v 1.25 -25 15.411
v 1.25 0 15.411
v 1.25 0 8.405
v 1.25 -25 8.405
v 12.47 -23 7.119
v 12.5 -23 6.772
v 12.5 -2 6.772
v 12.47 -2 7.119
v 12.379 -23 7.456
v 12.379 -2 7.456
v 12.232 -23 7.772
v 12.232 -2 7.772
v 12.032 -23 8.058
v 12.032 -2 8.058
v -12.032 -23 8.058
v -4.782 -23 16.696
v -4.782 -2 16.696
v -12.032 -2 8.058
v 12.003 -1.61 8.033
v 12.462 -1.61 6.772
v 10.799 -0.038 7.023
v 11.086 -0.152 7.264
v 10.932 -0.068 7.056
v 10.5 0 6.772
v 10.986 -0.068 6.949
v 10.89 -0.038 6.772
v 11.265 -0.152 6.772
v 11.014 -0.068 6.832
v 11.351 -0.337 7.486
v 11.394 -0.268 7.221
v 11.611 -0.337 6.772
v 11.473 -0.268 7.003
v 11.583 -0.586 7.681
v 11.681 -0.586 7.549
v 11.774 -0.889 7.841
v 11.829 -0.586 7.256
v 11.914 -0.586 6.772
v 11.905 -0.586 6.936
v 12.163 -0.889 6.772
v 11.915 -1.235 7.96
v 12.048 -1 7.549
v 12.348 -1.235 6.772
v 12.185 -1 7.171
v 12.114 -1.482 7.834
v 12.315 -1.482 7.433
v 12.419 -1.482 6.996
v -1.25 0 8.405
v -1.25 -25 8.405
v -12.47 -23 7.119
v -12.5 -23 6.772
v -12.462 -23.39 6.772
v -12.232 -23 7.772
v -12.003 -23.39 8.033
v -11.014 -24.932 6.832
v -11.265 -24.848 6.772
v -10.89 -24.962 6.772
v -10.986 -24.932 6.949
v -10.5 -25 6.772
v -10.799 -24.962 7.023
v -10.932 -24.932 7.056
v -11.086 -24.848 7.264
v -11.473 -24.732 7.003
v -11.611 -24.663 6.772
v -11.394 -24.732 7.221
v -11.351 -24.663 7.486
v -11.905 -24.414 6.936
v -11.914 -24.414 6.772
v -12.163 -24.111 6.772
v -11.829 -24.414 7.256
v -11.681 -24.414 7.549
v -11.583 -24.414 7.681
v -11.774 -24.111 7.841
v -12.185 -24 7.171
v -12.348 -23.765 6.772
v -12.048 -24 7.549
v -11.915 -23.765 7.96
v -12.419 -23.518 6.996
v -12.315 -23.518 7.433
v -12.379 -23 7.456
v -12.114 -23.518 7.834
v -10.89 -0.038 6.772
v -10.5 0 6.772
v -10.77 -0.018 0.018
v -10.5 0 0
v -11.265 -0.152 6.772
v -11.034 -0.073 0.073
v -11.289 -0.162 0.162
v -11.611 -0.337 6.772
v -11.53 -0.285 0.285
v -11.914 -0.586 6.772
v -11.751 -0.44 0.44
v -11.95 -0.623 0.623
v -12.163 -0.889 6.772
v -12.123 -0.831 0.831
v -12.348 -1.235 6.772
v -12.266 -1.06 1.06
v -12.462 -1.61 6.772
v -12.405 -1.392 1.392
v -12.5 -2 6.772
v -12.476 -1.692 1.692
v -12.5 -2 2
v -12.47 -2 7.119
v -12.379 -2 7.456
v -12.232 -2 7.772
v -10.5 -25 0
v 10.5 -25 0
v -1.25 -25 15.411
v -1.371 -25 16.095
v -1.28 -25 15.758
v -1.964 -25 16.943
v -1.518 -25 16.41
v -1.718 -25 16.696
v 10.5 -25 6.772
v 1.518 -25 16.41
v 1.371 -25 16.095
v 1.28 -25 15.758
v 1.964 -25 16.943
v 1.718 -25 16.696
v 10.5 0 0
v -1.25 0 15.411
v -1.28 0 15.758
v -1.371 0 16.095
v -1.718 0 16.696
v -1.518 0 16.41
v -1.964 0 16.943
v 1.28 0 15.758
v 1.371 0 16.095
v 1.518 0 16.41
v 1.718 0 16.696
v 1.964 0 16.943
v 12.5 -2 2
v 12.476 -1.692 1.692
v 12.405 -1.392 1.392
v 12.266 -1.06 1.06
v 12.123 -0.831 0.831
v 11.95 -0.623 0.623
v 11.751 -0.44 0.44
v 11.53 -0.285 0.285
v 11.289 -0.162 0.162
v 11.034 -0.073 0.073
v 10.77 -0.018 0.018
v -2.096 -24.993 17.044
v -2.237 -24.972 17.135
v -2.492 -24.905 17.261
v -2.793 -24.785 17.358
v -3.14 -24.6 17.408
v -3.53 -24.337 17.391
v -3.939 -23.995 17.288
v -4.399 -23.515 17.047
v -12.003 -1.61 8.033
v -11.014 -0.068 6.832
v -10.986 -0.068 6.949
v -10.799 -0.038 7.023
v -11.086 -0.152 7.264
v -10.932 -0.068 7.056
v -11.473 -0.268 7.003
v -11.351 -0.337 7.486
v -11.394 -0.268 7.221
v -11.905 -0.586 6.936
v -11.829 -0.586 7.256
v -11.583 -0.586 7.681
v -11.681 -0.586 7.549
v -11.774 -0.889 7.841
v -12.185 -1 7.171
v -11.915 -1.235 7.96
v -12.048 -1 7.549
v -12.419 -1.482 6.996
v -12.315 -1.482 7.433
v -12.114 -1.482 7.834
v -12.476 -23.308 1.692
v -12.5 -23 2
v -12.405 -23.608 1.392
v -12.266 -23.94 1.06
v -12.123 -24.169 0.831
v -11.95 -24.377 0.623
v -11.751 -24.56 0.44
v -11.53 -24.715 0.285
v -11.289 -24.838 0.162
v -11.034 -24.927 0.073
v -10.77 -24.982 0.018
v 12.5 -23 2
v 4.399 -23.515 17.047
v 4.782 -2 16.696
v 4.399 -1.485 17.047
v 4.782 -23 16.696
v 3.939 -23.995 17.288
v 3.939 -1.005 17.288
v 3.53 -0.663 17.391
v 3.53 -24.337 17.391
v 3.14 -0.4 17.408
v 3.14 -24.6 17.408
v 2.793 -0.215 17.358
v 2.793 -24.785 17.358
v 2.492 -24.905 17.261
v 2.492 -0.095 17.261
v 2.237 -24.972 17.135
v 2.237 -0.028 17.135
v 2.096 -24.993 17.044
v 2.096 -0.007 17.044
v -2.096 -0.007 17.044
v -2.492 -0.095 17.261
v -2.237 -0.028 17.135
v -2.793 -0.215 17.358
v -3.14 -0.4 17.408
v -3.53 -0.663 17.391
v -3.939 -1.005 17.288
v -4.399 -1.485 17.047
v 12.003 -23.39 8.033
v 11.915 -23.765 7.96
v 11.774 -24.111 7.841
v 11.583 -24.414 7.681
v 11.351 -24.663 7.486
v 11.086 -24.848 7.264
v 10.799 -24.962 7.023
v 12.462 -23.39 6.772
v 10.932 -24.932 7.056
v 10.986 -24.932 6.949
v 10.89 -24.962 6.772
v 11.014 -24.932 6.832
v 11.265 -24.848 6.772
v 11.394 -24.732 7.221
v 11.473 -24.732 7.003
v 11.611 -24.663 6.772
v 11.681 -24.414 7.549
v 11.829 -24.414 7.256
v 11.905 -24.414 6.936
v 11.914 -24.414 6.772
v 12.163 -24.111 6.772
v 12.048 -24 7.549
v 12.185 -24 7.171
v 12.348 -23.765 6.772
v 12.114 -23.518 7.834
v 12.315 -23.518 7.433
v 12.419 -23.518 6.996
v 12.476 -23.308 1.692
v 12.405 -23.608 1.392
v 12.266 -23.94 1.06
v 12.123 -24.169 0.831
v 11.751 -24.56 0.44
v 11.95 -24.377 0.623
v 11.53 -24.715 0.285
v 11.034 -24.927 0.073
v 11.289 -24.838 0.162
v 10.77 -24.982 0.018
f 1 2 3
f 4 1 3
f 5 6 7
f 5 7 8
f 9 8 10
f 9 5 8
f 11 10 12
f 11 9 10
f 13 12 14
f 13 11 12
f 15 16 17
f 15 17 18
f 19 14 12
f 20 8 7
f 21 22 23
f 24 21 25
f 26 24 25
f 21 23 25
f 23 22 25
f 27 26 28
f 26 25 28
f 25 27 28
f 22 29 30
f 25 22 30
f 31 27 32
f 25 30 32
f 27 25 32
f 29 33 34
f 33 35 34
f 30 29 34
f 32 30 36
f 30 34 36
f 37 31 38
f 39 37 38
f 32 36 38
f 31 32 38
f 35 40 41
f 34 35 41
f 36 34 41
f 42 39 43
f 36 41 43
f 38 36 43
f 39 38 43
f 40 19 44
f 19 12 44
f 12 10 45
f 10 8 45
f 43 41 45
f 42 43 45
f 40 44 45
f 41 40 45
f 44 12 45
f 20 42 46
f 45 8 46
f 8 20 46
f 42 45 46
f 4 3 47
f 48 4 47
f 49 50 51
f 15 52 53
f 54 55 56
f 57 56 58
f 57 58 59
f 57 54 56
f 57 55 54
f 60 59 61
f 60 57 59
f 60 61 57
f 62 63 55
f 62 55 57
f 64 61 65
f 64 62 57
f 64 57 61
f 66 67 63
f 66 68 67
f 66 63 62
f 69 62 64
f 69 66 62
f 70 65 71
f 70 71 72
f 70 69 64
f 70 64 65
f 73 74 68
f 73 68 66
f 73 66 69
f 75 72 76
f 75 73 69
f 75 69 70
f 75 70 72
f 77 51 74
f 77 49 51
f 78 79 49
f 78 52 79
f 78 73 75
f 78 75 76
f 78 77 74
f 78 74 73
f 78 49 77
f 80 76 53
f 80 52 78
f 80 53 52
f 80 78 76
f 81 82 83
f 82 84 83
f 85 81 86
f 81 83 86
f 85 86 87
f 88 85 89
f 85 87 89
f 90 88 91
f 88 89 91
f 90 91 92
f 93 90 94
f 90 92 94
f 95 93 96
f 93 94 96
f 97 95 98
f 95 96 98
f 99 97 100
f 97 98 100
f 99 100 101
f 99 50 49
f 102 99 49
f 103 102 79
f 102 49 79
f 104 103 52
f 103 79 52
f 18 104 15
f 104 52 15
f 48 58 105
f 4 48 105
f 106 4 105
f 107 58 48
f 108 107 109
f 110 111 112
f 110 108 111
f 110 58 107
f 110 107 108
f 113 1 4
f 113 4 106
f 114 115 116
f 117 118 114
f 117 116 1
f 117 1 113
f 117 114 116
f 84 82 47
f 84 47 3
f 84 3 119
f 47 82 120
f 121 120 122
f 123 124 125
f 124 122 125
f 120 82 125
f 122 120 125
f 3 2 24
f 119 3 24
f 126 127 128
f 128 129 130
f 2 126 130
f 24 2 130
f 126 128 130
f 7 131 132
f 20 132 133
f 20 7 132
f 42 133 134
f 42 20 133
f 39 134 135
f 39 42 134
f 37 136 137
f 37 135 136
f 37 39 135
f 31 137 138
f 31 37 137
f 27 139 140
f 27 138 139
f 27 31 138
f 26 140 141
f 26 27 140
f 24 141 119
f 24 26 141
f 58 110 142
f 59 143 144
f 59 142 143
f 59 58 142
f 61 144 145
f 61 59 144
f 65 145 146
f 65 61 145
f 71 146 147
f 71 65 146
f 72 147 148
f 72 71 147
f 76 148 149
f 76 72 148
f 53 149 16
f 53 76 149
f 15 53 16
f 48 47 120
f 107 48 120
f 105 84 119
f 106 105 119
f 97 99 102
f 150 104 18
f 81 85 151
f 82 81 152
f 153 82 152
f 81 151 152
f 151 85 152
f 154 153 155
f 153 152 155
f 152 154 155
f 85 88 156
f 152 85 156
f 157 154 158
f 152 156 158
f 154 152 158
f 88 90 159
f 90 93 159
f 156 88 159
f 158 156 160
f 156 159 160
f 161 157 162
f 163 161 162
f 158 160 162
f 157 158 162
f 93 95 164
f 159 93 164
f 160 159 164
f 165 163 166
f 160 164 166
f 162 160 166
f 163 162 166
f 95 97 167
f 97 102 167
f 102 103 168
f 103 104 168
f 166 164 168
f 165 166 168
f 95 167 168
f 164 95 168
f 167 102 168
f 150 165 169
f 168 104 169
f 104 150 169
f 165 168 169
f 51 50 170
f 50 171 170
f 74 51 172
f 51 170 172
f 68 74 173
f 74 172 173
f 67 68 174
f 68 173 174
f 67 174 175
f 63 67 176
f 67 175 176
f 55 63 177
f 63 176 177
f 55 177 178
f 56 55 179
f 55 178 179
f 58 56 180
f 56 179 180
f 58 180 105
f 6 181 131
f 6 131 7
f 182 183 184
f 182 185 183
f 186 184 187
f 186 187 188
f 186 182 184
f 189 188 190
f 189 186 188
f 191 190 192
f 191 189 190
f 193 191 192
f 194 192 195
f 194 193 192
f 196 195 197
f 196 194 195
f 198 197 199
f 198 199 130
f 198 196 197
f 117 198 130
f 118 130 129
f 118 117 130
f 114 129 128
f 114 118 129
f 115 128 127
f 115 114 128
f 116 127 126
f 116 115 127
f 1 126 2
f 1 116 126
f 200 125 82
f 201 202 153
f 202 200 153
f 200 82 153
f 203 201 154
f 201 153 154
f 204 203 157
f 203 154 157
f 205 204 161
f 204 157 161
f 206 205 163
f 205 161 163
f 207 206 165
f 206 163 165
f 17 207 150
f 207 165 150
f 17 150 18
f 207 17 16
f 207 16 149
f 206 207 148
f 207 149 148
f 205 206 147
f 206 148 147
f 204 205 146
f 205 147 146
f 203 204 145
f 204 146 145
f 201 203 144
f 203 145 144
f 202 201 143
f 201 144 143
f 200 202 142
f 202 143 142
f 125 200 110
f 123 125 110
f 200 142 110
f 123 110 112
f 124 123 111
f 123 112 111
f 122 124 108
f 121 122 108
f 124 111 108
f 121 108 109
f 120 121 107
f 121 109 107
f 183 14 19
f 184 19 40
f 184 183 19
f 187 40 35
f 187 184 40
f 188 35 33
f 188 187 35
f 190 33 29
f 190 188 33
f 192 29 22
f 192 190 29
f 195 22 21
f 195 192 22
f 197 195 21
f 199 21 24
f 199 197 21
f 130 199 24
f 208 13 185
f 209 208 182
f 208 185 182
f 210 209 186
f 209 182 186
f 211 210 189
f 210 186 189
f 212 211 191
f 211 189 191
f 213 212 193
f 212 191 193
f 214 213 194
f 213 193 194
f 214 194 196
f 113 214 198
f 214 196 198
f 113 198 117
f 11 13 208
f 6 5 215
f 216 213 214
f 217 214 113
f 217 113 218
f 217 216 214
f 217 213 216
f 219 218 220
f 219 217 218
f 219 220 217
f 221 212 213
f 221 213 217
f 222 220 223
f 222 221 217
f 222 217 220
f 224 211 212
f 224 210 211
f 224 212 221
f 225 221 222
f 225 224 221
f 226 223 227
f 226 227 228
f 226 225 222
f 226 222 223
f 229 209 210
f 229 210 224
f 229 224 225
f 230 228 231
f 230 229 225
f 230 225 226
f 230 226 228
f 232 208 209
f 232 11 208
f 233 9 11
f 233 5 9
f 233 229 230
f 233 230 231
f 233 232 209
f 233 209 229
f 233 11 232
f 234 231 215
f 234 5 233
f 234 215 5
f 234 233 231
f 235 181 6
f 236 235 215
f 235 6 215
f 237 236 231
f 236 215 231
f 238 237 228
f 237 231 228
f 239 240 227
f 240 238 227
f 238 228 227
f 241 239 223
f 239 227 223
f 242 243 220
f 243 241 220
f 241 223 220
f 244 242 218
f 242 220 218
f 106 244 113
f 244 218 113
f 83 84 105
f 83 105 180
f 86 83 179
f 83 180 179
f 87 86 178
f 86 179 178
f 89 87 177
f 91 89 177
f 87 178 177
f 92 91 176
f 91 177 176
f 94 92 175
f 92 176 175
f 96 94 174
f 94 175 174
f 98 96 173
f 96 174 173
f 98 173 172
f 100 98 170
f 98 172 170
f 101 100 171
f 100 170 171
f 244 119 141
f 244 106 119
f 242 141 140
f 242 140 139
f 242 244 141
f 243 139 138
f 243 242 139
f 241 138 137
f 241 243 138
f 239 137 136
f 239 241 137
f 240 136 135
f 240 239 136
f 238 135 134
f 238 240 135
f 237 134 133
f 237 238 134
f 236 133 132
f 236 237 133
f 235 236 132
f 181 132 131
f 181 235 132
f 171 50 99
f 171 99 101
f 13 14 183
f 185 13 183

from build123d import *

# Parameters (mm, degrees)
F1_DEPTH = 25
F2_R     = 2
F3_R     = 2


with BuildPart() as f1:
    # F0 (on Front) → F1 (new body)
    with BuildSketch(Plane.XZ):
        Polygon((-12.5, 7.5), (-12.5, 0), (12.5, 0), (12.5, 7.5), (1.25, 20.904757), (1.25, 8.404757), (-1.25, 8.404757), (-1.25, 20.904757), align=None)
    extrude(amount=F1_DEPTH)

    # F2
    f2_edges = [f1.edges().sort_by_distance(p)[0] for p in [
        (12.5, -12.5, 7.5),
        (1.25, -12.5, 20.904757),
        (6.875, 0, 14.202378),
        (6.875, -25, 14.202378),
        (12.5, -12.5, 0),
        (12.5, 0, 3.75),
        (12.5, -25, 3.75),
    ]]
    fillet(f2_edges, radius=F2_R)

    # F3
    f3_edges = [f1.edges().sort_by_distance(p)[0] for p in [
        (-12.5, -12.5, 7.5),
        (-12.5, -12.5, 0),
        (-12.5, 0, 3.75),
        (-12.5, -25, 3.75),
        (-1.25, -12.5, 20.904757),
        (-6.875, 0, 14.202378),
        (-6.875, -25, 14.202378),
    ]]
    fillet(f3_edges, radius=F3_R)


solid = f1.part
